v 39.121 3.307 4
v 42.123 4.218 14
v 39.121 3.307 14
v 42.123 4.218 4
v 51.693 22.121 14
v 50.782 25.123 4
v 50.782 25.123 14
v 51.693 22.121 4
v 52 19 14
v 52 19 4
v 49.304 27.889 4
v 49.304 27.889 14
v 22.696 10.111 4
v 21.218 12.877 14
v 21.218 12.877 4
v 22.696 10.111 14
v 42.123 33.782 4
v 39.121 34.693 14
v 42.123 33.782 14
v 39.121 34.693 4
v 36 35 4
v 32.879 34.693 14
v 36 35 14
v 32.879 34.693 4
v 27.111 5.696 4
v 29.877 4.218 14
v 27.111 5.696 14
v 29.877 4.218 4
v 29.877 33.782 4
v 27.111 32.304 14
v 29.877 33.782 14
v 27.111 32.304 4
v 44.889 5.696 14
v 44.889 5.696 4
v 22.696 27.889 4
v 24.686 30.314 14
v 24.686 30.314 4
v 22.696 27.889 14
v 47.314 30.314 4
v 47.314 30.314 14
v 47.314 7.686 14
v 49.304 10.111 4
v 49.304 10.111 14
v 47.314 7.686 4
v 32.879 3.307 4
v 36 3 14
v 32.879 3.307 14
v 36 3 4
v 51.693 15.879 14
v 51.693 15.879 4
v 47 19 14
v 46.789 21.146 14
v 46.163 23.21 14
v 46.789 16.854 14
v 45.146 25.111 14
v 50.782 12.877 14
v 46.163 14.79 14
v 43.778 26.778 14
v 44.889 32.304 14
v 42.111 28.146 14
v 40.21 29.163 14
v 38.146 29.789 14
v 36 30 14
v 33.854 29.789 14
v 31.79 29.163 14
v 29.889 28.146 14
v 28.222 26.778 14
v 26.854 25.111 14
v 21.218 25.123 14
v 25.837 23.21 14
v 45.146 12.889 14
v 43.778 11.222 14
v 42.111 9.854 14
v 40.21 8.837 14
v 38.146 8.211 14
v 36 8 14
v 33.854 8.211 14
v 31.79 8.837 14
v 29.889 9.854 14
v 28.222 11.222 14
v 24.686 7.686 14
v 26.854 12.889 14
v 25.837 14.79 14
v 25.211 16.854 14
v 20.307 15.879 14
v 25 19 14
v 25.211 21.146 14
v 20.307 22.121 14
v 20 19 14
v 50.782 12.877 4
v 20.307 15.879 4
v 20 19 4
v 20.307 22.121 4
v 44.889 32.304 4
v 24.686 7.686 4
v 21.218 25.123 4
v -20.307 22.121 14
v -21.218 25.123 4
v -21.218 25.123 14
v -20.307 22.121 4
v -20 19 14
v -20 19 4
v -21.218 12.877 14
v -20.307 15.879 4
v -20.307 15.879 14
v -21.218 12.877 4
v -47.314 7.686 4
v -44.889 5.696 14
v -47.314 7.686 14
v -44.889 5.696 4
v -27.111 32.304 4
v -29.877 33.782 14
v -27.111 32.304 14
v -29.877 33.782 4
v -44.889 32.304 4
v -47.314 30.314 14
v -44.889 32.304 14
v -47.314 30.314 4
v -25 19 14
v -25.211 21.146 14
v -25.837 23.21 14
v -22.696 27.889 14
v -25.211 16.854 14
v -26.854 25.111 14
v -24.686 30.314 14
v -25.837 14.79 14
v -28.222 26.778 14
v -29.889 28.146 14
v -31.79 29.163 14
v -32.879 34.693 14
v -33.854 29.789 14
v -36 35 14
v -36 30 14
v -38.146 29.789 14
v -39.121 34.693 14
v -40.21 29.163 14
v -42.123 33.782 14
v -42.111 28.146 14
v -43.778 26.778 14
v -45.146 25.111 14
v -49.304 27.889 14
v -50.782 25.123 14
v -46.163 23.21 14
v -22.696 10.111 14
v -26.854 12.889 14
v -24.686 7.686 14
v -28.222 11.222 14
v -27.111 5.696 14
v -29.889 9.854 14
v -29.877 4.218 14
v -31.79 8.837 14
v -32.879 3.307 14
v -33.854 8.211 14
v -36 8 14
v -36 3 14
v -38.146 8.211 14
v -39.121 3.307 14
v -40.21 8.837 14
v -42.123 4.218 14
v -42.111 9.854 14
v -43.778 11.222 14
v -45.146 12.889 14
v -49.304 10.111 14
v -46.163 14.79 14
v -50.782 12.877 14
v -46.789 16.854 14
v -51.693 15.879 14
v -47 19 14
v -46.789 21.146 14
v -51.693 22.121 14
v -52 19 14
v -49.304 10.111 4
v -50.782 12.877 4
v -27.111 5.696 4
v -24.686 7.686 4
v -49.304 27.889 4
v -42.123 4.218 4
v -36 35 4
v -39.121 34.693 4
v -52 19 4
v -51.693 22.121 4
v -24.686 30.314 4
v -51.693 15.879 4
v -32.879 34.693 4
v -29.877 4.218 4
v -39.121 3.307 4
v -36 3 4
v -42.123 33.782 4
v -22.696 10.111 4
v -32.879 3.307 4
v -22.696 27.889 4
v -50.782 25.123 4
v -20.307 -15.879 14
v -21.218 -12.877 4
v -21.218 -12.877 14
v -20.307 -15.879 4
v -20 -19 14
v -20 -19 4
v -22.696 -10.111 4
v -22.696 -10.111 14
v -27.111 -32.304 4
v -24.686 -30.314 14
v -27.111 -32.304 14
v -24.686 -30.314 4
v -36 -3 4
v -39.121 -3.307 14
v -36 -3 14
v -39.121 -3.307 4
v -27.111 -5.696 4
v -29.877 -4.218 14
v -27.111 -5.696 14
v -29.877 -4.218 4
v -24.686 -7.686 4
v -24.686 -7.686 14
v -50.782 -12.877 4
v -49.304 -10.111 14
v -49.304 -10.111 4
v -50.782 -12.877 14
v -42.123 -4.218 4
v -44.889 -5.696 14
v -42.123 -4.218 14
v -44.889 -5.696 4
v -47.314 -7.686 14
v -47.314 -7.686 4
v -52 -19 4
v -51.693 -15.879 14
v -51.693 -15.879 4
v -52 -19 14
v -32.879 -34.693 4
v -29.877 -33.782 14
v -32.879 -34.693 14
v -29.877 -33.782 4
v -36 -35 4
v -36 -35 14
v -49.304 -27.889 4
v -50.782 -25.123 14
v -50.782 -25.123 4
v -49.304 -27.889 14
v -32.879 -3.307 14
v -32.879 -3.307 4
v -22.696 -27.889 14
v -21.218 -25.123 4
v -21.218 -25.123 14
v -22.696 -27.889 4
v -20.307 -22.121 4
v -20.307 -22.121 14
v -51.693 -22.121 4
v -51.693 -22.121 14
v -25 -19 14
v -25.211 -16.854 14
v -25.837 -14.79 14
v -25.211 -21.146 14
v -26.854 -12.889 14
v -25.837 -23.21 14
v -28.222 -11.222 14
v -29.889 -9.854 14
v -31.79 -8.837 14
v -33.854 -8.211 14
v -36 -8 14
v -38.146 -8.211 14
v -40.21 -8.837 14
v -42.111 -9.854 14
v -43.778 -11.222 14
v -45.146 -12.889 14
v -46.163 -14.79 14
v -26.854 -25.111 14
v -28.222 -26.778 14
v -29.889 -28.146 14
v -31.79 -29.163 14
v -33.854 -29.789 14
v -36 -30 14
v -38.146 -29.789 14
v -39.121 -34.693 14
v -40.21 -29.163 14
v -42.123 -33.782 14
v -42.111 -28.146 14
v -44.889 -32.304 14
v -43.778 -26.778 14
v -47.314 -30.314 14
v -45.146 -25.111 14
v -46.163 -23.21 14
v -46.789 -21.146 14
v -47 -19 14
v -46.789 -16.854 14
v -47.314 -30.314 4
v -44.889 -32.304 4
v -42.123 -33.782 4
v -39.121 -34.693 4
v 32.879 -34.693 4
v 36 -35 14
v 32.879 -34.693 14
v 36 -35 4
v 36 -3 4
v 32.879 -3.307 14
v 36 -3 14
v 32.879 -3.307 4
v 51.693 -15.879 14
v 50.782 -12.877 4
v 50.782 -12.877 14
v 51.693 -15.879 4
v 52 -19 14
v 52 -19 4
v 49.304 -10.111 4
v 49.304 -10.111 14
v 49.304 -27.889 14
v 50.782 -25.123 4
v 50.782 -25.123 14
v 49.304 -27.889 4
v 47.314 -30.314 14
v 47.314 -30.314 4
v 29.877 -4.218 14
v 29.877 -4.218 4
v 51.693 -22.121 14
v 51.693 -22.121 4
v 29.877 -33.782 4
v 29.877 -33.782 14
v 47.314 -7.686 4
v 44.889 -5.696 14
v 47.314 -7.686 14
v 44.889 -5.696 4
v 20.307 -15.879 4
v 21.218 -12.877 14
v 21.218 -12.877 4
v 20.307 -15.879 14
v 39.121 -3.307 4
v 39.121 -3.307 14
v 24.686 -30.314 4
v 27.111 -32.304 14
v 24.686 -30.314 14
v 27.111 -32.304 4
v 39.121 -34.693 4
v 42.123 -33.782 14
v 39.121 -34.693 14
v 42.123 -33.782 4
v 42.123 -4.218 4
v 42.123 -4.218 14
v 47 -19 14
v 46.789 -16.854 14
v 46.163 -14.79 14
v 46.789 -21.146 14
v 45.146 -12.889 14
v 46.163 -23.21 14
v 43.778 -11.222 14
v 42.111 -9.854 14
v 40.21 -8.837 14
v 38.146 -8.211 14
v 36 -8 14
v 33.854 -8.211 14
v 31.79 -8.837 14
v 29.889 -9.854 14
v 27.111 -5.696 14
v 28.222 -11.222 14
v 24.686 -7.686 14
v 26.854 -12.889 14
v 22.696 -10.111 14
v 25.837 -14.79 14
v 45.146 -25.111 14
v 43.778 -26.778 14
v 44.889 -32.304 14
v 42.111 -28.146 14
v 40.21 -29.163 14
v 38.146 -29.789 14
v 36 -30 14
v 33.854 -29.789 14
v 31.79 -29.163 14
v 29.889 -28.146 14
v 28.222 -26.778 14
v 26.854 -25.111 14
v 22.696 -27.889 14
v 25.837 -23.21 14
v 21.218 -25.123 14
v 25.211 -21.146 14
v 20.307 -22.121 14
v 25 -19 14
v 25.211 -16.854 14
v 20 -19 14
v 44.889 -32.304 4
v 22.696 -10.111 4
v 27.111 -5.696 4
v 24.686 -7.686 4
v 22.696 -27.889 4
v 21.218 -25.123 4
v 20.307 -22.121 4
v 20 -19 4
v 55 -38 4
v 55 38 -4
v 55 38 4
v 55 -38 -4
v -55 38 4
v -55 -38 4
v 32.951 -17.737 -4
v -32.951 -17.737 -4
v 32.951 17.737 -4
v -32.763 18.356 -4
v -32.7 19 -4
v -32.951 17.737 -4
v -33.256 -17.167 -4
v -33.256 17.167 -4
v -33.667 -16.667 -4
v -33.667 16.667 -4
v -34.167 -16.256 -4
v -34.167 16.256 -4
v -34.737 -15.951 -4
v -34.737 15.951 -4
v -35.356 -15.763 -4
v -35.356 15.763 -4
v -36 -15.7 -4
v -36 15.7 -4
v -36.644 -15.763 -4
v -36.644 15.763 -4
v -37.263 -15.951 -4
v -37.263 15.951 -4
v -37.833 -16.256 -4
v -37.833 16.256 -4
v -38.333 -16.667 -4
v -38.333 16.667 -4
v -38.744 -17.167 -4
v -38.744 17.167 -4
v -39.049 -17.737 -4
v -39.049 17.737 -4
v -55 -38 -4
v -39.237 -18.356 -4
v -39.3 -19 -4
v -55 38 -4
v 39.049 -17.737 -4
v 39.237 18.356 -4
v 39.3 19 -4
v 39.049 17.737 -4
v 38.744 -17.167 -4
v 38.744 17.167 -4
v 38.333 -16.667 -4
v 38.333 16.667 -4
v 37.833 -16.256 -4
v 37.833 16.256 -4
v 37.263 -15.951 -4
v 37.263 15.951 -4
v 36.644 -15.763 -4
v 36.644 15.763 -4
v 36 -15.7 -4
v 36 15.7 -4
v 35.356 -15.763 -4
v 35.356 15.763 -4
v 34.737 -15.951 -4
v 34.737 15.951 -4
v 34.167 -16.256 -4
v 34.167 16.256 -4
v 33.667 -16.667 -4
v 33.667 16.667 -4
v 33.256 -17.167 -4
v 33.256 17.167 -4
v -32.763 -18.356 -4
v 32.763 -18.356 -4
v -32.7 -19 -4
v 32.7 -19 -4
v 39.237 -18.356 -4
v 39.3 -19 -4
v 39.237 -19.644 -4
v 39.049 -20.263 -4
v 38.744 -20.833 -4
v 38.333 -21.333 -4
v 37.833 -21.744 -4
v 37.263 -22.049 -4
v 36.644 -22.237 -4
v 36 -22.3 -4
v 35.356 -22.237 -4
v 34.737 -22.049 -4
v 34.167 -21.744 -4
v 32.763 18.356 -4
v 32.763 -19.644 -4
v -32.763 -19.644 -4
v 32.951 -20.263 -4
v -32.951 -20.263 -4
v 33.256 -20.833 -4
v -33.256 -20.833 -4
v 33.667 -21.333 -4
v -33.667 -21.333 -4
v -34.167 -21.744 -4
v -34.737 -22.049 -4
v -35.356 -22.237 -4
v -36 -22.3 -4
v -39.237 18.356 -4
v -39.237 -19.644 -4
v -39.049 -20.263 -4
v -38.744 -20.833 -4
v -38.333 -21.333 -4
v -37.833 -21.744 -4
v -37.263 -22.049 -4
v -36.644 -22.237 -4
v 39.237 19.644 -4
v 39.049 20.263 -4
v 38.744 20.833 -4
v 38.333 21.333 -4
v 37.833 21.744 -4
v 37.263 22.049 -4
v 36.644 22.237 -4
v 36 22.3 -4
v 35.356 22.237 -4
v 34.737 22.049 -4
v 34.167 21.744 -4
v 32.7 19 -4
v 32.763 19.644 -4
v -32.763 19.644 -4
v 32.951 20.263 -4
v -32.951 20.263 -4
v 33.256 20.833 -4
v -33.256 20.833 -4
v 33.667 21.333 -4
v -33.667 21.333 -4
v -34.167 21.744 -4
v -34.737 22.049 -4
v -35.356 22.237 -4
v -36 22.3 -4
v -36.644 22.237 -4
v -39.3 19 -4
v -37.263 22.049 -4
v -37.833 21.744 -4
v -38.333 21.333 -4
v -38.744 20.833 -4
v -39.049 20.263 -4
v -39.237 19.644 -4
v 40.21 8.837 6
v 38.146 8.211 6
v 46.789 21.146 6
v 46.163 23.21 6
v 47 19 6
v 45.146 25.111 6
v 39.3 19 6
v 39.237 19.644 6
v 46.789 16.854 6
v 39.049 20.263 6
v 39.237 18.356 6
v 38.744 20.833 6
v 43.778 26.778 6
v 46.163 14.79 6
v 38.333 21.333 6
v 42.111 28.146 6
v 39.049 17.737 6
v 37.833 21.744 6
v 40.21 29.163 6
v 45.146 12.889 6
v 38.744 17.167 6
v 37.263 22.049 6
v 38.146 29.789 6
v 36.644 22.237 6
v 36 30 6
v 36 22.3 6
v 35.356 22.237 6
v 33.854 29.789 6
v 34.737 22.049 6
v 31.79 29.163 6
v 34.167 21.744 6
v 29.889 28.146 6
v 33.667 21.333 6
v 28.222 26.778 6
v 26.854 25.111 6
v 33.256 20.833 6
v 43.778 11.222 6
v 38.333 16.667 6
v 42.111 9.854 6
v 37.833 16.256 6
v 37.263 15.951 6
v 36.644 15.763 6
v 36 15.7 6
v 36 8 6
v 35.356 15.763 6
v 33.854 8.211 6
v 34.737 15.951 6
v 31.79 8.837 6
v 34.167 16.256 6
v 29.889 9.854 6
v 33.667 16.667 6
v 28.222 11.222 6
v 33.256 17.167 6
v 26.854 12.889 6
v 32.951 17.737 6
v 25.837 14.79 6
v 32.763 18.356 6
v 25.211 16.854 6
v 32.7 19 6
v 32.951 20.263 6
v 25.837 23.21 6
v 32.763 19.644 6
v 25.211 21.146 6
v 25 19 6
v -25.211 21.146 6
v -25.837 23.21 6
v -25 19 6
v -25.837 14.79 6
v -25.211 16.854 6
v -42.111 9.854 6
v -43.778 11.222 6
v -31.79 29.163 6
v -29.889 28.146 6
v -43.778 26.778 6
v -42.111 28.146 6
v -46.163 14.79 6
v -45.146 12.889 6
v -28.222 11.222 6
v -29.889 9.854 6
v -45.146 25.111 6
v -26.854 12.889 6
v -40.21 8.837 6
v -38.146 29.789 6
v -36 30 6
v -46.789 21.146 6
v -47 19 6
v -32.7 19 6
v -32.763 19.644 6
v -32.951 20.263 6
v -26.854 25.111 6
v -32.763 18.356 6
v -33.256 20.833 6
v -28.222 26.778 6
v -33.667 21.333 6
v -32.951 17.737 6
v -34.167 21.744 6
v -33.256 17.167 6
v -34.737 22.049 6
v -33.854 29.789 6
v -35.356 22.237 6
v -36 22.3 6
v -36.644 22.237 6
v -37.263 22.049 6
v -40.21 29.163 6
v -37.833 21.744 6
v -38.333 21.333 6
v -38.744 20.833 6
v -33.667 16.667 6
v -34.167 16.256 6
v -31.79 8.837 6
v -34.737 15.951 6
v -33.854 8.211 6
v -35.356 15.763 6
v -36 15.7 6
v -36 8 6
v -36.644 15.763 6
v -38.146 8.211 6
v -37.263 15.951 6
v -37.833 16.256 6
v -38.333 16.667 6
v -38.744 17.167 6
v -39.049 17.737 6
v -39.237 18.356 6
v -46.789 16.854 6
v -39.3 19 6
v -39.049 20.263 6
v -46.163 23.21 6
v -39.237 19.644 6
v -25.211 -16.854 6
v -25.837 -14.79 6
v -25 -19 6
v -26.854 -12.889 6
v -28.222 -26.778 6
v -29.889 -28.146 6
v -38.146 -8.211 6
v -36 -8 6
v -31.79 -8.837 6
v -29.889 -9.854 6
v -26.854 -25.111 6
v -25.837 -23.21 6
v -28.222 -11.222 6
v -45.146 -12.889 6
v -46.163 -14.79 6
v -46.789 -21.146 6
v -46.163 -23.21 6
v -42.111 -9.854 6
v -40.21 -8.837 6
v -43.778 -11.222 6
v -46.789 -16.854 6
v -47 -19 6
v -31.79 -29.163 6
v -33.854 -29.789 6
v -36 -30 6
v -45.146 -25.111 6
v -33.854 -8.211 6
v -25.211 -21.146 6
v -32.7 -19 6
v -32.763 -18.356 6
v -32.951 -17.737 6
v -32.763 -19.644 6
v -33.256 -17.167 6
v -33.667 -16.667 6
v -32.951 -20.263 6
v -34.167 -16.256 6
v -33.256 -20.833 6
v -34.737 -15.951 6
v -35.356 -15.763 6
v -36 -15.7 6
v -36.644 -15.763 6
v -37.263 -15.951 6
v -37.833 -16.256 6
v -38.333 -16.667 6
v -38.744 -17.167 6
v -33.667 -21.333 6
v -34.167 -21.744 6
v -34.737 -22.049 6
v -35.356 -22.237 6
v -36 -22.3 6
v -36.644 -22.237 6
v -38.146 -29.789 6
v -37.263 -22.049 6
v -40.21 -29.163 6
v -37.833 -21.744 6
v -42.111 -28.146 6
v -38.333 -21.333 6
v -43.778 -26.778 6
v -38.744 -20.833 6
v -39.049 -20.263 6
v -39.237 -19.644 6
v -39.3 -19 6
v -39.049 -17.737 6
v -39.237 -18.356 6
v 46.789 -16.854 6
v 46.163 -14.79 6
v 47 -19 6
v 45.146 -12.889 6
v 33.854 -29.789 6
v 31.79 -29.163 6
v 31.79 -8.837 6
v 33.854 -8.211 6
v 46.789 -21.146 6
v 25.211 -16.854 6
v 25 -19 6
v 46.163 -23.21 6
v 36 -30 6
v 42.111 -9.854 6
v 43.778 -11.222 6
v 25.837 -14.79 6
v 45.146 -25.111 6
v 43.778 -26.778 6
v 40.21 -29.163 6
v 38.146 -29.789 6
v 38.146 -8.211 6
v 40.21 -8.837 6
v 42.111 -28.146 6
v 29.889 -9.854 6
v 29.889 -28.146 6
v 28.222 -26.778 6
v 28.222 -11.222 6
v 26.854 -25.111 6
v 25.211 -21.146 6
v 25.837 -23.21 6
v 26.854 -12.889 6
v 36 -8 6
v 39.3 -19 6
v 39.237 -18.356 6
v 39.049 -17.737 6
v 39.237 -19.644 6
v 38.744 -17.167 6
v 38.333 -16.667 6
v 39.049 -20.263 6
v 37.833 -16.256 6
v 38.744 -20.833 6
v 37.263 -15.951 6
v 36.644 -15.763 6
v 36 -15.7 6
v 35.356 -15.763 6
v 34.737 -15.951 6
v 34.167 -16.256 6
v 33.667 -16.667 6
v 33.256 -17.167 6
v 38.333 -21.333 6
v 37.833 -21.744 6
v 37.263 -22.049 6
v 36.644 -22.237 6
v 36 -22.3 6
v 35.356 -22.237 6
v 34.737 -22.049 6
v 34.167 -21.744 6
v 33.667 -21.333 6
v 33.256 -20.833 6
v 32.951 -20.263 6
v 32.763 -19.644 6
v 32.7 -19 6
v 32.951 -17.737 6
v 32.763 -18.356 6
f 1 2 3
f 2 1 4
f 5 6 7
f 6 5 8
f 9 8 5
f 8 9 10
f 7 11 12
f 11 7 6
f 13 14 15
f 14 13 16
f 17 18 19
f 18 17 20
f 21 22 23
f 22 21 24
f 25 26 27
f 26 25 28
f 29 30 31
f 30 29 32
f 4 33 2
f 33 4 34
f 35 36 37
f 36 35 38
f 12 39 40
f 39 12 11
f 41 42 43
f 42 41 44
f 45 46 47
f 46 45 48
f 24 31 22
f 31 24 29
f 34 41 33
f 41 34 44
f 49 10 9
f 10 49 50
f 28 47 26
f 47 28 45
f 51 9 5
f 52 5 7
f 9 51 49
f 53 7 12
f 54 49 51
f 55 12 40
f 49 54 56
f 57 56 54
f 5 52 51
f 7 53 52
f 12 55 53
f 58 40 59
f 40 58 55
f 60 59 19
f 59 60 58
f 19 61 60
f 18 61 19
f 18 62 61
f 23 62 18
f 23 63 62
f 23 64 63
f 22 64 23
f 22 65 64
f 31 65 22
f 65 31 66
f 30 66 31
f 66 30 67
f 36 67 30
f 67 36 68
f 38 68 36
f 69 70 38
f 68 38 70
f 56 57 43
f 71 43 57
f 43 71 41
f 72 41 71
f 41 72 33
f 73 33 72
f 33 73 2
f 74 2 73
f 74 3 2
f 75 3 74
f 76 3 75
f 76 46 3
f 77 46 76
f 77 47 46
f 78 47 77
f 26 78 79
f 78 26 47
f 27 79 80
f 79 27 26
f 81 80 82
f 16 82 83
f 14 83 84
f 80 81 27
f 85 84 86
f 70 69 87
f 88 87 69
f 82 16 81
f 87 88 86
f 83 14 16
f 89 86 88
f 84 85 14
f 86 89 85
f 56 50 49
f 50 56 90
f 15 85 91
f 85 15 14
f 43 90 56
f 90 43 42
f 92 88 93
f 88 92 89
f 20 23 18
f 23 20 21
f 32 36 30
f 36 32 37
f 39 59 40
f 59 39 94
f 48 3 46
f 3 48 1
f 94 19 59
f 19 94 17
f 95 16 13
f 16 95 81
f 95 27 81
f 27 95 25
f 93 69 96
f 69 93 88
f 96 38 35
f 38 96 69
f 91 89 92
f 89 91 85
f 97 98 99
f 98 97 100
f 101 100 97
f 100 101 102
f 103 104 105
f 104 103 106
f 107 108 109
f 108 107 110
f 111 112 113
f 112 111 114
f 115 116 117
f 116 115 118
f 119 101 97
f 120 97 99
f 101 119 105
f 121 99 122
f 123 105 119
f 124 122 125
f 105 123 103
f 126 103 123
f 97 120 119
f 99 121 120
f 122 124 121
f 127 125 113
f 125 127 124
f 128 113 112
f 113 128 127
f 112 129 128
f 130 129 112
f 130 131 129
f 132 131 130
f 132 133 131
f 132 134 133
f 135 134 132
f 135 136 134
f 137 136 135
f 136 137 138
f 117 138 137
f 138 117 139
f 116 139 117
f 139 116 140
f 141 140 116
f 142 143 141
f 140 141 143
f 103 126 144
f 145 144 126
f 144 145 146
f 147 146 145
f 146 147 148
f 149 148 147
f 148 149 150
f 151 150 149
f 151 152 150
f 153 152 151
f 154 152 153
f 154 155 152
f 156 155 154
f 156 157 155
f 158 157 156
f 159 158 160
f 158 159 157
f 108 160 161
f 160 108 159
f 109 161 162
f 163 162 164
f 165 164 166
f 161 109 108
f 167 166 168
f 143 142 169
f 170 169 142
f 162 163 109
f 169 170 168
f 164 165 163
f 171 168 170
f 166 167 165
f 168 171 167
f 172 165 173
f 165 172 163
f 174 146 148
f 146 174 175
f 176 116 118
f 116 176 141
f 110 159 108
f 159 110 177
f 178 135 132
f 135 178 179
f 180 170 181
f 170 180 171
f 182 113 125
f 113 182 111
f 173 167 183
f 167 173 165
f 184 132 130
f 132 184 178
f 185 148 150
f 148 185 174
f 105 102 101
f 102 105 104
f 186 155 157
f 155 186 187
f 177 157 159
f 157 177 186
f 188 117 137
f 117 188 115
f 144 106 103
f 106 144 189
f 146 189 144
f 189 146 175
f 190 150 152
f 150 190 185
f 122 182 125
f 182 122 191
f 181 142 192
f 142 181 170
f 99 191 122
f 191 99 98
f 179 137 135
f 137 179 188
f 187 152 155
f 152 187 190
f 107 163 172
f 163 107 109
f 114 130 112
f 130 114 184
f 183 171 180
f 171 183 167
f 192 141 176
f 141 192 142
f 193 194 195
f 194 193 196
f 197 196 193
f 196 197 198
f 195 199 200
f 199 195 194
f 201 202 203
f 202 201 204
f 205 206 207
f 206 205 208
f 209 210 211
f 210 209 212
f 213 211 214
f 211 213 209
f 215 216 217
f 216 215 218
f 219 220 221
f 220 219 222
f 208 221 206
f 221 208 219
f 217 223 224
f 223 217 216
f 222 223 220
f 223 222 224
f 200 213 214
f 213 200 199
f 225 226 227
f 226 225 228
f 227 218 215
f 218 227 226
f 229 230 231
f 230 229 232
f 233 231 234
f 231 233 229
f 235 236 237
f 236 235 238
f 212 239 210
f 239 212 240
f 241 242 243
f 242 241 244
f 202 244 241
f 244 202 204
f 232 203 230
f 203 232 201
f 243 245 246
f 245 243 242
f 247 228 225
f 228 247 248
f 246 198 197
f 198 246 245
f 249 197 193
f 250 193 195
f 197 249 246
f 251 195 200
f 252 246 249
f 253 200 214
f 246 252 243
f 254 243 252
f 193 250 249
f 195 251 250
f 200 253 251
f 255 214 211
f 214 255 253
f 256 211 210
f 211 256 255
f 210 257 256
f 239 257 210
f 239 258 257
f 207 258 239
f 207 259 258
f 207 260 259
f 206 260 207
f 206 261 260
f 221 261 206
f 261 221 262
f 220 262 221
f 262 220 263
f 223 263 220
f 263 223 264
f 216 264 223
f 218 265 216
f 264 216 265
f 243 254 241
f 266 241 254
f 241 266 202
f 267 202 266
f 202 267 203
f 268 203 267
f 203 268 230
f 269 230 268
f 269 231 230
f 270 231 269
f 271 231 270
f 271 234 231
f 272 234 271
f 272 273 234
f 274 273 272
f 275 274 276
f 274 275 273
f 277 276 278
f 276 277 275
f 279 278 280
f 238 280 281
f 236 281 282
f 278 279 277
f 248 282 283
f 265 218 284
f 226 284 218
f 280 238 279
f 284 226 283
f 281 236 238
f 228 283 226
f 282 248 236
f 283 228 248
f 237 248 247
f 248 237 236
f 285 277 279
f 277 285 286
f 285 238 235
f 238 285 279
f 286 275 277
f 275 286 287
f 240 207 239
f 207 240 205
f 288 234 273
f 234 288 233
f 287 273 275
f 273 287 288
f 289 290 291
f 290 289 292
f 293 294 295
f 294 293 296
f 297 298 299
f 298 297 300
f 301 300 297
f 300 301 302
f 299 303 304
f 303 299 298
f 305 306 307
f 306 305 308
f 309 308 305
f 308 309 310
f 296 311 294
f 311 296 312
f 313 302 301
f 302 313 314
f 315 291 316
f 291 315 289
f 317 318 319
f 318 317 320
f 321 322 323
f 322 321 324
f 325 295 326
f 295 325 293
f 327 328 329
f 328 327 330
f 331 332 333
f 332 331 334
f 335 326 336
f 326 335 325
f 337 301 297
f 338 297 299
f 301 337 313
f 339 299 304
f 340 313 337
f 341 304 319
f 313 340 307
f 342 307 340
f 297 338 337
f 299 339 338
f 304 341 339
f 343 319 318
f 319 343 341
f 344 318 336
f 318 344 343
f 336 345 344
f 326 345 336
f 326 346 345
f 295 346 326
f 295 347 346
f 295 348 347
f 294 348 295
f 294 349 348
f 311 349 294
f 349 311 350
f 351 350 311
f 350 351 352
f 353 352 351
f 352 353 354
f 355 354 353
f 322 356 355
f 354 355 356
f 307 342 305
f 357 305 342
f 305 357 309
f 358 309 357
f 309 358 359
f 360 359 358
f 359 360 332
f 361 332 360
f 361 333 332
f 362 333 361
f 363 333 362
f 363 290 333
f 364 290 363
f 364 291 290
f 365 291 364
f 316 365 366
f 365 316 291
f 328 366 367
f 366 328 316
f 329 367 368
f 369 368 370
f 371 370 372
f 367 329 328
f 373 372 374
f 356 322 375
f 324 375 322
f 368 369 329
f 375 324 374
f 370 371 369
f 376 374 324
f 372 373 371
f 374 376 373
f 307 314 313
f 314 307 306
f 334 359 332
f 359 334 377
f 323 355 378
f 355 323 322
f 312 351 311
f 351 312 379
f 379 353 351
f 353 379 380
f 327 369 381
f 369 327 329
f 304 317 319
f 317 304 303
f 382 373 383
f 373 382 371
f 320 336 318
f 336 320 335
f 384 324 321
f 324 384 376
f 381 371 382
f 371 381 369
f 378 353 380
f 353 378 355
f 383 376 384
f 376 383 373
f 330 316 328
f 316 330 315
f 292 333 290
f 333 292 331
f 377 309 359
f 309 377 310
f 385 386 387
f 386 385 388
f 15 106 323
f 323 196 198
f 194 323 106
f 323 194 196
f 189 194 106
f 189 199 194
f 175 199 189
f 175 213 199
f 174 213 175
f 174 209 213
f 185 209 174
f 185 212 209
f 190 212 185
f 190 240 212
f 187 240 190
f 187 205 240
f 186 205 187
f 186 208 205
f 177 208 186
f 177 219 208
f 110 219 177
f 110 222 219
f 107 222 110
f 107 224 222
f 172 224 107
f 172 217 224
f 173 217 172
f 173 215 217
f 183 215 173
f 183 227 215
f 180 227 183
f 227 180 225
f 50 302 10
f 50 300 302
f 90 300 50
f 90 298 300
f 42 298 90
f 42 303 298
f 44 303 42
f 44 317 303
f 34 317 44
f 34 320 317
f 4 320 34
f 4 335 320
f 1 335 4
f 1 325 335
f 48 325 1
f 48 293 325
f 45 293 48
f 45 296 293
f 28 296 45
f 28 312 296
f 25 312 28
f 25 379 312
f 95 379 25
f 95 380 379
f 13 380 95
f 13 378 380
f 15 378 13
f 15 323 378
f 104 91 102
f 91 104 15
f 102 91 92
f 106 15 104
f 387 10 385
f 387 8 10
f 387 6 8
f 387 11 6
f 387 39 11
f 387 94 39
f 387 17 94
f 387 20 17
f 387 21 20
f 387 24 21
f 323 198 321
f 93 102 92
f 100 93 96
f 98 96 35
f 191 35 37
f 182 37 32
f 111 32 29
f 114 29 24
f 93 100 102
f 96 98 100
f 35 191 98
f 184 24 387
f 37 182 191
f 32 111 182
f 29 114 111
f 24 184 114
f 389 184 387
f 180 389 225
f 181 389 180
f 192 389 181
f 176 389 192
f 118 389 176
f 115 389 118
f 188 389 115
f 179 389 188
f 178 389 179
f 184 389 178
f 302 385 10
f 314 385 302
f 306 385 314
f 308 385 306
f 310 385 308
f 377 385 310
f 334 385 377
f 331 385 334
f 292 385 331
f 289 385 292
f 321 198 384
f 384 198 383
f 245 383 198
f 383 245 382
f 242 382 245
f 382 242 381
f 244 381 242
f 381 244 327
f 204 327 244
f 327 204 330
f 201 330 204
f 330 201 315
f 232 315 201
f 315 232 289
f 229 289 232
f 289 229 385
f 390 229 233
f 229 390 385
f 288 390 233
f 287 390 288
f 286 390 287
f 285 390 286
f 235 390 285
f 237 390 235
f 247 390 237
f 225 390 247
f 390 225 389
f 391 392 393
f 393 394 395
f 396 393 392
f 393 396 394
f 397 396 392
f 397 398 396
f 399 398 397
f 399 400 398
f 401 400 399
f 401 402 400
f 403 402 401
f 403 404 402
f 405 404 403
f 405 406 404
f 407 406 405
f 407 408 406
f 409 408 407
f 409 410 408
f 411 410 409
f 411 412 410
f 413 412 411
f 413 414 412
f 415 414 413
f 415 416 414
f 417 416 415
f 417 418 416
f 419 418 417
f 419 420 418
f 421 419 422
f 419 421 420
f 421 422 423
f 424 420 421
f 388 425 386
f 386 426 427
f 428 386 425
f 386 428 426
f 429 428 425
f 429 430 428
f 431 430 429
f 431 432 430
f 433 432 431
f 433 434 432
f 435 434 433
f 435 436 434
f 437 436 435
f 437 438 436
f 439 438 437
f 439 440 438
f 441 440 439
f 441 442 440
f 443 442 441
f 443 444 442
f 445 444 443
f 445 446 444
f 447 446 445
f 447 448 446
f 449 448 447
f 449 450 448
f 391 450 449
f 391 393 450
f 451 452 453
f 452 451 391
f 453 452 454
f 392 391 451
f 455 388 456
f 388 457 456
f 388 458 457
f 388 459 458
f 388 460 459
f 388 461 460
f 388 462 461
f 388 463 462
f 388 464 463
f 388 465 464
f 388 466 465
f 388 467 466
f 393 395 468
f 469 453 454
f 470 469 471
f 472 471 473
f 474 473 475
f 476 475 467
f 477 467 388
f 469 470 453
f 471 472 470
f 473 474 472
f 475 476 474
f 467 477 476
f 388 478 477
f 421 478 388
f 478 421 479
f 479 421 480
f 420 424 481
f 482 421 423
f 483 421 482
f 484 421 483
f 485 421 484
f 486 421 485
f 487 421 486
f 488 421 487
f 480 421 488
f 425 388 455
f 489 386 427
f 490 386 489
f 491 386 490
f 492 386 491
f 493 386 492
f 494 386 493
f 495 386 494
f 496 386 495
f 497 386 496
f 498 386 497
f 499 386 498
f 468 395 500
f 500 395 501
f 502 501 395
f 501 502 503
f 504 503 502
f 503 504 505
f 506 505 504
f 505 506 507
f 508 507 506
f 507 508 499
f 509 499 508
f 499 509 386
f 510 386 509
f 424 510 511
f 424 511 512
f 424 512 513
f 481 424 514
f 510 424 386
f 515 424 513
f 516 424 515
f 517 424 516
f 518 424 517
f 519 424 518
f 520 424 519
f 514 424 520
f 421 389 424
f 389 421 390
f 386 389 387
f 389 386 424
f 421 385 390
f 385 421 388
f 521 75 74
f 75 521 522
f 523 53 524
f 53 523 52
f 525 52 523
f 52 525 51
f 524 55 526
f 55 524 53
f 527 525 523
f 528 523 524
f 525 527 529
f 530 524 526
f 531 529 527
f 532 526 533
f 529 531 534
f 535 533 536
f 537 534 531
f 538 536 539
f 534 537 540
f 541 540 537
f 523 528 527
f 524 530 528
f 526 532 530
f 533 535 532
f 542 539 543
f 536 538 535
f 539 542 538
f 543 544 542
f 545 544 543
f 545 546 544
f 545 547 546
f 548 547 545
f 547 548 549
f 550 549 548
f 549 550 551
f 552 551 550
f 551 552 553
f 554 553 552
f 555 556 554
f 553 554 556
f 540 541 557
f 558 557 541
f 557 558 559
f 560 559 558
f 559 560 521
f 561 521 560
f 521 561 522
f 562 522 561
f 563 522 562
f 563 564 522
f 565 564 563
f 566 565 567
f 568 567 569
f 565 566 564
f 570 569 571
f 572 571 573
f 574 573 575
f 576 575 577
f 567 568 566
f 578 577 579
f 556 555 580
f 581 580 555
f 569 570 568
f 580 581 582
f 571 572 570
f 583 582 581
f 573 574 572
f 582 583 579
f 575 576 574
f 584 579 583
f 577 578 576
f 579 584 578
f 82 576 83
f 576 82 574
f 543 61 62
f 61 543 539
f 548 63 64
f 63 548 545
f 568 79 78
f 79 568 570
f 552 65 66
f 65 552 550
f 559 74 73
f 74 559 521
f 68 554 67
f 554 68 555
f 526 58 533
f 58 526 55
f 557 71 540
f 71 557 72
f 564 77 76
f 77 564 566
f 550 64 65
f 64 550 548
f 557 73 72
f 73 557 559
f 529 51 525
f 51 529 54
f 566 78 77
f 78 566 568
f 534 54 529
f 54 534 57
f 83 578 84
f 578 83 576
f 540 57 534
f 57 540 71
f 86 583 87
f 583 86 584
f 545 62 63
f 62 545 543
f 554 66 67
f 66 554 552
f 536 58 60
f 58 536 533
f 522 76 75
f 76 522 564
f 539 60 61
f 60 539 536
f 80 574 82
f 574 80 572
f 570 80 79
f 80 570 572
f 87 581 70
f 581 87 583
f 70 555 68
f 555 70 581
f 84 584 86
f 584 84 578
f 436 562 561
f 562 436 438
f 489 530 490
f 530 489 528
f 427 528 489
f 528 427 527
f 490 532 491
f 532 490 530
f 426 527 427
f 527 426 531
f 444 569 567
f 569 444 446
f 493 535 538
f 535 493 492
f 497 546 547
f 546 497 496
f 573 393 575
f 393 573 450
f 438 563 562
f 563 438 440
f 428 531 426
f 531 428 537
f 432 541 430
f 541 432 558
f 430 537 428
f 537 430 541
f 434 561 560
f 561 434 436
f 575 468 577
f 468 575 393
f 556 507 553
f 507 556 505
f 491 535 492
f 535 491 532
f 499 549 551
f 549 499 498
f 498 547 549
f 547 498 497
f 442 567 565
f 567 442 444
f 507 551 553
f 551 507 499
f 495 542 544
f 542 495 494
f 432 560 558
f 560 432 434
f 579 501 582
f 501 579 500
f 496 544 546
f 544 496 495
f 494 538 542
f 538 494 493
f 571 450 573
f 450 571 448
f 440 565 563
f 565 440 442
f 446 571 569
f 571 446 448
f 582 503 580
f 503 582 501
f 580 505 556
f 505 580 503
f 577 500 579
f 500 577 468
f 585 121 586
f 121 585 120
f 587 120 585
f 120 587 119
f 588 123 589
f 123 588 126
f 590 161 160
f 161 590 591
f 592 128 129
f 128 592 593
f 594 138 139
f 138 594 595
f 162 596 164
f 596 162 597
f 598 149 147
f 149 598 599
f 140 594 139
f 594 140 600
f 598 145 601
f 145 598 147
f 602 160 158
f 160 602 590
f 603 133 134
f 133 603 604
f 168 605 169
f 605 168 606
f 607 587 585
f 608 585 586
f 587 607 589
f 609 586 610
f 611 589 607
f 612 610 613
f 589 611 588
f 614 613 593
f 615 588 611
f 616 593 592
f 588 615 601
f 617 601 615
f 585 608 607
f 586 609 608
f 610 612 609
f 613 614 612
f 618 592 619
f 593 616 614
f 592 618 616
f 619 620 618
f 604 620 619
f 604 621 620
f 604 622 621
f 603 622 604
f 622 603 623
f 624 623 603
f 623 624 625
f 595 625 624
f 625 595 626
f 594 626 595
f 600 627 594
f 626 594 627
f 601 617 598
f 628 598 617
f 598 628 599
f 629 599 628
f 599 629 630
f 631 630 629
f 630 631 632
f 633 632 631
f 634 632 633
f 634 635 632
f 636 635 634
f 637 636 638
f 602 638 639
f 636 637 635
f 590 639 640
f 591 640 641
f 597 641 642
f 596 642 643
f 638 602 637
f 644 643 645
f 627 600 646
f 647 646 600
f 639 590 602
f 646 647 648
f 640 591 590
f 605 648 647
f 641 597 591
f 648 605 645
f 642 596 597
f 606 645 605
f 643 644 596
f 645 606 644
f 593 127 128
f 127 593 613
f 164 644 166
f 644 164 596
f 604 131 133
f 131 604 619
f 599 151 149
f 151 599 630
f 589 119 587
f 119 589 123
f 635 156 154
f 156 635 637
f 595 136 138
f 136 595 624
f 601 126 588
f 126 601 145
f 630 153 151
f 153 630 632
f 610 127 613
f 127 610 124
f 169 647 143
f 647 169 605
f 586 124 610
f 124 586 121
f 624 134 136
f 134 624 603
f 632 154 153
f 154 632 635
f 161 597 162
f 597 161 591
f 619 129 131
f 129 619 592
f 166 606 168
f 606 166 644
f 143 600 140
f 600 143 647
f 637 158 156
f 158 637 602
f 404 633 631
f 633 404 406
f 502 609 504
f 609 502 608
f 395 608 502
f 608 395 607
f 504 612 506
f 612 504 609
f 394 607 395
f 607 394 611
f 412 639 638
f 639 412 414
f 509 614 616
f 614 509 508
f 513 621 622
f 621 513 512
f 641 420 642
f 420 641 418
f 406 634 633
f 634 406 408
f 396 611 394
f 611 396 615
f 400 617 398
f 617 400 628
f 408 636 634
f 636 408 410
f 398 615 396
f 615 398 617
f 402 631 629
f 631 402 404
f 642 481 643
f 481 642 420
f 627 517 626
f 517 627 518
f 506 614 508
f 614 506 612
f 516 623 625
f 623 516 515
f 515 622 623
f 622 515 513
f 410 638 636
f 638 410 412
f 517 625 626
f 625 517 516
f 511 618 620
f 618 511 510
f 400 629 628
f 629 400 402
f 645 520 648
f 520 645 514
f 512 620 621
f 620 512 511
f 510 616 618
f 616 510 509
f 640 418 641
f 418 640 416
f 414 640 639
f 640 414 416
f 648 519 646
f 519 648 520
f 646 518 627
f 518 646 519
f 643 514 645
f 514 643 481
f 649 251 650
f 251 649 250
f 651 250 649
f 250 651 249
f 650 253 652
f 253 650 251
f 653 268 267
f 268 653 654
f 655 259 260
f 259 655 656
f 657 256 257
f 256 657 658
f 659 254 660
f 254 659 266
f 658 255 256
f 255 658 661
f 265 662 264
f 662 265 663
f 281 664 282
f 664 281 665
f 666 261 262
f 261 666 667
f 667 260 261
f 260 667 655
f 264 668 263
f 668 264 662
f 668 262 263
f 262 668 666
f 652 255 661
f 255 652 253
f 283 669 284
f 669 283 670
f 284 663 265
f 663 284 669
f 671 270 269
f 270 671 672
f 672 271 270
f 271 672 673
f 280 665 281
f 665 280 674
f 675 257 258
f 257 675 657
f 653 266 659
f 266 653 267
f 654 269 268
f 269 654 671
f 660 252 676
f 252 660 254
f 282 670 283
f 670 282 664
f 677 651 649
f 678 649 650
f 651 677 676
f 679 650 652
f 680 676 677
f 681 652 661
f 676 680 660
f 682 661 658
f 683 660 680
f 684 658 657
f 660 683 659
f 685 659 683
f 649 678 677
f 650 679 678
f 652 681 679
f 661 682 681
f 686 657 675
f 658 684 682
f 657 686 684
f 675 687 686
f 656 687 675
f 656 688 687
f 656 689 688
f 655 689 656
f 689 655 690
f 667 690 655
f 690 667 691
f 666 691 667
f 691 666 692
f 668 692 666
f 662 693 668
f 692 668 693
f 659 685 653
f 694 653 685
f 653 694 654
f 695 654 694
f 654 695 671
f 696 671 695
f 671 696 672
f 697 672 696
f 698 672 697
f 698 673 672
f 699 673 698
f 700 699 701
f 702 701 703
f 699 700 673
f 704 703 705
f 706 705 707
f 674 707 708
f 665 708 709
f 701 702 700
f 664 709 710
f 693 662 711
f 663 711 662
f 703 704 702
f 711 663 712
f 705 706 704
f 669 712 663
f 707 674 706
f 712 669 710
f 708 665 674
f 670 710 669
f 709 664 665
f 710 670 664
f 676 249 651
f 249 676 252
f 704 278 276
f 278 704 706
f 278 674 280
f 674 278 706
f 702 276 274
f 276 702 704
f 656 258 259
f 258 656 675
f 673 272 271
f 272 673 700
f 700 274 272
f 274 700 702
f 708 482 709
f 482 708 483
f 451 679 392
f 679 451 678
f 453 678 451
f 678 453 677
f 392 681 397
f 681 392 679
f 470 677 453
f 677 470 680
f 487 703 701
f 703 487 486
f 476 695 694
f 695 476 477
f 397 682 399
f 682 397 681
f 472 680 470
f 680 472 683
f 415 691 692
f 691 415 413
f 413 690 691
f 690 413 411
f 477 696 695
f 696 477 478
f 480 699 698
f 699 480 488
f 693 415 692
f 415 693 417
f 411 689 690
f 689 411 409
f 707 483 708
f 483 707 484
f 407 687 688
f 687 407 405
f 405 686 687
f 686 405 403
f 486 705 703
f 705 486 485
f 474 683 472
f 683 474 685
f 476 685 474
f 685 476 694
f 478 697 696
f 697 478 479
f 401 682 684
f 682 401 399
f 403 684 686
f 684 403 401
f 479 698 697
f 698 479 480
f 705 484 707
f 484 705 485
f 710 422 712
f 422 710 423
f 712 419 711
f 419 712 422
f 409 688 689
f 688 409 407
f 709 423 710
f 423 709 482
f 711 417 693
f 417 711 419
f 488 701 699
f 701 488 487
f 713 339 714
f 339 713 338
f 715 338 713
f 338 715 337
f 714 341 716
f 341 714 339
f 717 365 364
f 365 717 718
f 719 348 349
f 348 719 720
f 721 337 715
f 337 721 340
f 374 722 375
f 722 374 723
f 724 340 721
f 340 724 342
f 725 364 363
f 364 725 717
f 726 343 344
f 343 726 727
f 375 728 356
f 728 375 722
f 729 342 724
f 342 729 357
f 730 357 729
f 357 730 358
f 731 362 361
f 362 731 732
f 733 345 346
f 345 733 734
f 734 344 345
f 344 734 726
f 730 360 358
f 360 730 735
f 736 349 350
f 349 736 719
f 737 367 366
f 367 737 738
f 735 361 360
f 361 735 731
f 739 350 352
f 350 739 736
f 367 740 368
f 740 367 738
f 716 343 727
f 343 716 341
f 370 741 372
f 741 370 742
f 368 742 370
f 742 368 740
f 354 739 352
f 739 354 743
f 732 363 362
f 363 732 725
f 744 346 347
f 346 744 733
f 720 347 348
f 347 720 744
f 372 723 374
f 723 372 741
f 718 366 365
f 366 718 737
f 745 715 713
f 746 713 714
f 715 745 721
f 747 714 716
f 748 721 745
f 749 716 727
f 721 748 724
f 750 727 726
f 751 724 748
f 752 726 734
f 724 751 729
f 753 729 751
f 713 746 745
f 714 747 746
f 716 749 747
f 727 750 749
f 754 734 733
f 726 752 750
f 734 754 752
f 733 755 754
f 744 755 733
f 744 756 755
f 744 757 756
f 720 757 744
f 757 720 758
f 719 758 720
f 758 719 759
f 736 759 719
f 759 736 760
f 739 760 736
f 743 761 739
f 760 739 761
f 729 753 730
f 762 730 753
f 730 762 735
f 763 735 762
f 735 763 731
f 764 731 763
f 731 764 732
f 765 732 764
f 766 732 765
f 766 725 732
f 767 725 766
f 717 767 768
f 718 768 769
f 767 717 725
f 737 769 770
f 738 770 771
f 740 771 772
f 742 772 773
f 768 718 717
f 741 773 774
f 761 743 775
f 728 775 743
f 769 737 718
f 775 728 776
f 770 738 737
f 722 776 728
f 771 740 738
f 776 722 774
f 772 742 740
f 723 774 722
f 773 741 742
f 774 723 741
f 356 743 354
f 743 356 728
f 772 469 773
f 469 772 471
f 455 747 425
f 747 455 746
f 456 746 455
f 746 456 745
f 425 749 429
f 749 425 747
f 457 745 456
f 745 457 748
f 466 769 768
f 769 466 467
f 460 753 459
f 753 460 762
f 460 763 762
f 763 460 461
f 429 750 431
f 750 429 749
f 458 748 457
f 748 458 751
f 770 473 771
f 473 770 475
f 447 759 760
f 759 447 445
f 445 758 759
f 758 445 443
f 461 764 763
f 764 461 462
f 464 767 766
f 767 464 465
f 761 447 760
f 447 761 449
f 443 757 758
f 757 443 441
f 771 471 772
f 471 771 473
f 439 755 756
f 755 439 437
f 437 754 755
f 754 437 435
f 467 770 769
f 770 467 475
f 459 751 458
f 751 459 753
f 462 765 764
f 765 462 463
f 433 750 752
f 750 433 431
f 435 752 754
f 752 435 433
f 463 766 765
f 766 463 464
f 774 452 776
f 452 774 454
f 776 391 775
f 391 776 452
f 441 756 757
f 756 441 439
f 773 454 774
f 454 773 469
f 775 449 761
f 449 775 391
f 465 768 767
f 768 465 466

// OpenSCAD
$fn = 32;

// ----------------------------------------------------------------------
// Socket pad plate
// bosses with counterbored sockets for the screws
// ----------------------------------------------------------------------

// --- parameters (mm) ---
base_t = 8;            // base plate thickness
boss_h = 10;           // boss height above the base plate
boss_d = 32;           // boss diameter
socket_d = 22;         // socket diameter
socket_depth = 8;      // socket depth from the boss face
bolt_d = 6.6;          // screw clearance hole through the socket floor
plate = [110, 76, 8];  // overall size (x, y, z)
edge = 19;             // boss centre offset from the plate edge
pads = 4;              // boss count, one per corner

// --- derived feature positions (mm) ---
height = base_t + boss_h;        // = 18   overall height of the part
corner_x = plate[0] / 2 - edge;  // = 36   boss centre X
corner_y = plate[1] / 2 - edge;  // = 19   boss centre Y
feature_centers = [
  [corner_x, corner_y],
  [-corner_x, corner_y],
  [-corner_x, -corner_y],
  [corner_x, -corner_y]
];   // boss centres: sockets, holes and the pads themselves are placed from here

// base plate, bosses on feature_centers, socket + through hole in each
difference() {
  union() {
    cube(plate, center = true);
    for (centre = feature_centers)
      translate([centre[0], centre[1], plate[2] / 2 - 1])
        cylinder(d = boss_d, h = boss_h + 1);
  }
  for (centre = feature_centers) {
    translate([centre[0], centre[1], plate[2] / 2 + boss_h - socket_depth])
      cylinder(d = socket_d, h = socket_depth + 1);
    translate([centre[0], centre[1], -height])
      cylinder(d = bolt_d, h = 2 * height + 2);  // through the socket floor
  }
}
